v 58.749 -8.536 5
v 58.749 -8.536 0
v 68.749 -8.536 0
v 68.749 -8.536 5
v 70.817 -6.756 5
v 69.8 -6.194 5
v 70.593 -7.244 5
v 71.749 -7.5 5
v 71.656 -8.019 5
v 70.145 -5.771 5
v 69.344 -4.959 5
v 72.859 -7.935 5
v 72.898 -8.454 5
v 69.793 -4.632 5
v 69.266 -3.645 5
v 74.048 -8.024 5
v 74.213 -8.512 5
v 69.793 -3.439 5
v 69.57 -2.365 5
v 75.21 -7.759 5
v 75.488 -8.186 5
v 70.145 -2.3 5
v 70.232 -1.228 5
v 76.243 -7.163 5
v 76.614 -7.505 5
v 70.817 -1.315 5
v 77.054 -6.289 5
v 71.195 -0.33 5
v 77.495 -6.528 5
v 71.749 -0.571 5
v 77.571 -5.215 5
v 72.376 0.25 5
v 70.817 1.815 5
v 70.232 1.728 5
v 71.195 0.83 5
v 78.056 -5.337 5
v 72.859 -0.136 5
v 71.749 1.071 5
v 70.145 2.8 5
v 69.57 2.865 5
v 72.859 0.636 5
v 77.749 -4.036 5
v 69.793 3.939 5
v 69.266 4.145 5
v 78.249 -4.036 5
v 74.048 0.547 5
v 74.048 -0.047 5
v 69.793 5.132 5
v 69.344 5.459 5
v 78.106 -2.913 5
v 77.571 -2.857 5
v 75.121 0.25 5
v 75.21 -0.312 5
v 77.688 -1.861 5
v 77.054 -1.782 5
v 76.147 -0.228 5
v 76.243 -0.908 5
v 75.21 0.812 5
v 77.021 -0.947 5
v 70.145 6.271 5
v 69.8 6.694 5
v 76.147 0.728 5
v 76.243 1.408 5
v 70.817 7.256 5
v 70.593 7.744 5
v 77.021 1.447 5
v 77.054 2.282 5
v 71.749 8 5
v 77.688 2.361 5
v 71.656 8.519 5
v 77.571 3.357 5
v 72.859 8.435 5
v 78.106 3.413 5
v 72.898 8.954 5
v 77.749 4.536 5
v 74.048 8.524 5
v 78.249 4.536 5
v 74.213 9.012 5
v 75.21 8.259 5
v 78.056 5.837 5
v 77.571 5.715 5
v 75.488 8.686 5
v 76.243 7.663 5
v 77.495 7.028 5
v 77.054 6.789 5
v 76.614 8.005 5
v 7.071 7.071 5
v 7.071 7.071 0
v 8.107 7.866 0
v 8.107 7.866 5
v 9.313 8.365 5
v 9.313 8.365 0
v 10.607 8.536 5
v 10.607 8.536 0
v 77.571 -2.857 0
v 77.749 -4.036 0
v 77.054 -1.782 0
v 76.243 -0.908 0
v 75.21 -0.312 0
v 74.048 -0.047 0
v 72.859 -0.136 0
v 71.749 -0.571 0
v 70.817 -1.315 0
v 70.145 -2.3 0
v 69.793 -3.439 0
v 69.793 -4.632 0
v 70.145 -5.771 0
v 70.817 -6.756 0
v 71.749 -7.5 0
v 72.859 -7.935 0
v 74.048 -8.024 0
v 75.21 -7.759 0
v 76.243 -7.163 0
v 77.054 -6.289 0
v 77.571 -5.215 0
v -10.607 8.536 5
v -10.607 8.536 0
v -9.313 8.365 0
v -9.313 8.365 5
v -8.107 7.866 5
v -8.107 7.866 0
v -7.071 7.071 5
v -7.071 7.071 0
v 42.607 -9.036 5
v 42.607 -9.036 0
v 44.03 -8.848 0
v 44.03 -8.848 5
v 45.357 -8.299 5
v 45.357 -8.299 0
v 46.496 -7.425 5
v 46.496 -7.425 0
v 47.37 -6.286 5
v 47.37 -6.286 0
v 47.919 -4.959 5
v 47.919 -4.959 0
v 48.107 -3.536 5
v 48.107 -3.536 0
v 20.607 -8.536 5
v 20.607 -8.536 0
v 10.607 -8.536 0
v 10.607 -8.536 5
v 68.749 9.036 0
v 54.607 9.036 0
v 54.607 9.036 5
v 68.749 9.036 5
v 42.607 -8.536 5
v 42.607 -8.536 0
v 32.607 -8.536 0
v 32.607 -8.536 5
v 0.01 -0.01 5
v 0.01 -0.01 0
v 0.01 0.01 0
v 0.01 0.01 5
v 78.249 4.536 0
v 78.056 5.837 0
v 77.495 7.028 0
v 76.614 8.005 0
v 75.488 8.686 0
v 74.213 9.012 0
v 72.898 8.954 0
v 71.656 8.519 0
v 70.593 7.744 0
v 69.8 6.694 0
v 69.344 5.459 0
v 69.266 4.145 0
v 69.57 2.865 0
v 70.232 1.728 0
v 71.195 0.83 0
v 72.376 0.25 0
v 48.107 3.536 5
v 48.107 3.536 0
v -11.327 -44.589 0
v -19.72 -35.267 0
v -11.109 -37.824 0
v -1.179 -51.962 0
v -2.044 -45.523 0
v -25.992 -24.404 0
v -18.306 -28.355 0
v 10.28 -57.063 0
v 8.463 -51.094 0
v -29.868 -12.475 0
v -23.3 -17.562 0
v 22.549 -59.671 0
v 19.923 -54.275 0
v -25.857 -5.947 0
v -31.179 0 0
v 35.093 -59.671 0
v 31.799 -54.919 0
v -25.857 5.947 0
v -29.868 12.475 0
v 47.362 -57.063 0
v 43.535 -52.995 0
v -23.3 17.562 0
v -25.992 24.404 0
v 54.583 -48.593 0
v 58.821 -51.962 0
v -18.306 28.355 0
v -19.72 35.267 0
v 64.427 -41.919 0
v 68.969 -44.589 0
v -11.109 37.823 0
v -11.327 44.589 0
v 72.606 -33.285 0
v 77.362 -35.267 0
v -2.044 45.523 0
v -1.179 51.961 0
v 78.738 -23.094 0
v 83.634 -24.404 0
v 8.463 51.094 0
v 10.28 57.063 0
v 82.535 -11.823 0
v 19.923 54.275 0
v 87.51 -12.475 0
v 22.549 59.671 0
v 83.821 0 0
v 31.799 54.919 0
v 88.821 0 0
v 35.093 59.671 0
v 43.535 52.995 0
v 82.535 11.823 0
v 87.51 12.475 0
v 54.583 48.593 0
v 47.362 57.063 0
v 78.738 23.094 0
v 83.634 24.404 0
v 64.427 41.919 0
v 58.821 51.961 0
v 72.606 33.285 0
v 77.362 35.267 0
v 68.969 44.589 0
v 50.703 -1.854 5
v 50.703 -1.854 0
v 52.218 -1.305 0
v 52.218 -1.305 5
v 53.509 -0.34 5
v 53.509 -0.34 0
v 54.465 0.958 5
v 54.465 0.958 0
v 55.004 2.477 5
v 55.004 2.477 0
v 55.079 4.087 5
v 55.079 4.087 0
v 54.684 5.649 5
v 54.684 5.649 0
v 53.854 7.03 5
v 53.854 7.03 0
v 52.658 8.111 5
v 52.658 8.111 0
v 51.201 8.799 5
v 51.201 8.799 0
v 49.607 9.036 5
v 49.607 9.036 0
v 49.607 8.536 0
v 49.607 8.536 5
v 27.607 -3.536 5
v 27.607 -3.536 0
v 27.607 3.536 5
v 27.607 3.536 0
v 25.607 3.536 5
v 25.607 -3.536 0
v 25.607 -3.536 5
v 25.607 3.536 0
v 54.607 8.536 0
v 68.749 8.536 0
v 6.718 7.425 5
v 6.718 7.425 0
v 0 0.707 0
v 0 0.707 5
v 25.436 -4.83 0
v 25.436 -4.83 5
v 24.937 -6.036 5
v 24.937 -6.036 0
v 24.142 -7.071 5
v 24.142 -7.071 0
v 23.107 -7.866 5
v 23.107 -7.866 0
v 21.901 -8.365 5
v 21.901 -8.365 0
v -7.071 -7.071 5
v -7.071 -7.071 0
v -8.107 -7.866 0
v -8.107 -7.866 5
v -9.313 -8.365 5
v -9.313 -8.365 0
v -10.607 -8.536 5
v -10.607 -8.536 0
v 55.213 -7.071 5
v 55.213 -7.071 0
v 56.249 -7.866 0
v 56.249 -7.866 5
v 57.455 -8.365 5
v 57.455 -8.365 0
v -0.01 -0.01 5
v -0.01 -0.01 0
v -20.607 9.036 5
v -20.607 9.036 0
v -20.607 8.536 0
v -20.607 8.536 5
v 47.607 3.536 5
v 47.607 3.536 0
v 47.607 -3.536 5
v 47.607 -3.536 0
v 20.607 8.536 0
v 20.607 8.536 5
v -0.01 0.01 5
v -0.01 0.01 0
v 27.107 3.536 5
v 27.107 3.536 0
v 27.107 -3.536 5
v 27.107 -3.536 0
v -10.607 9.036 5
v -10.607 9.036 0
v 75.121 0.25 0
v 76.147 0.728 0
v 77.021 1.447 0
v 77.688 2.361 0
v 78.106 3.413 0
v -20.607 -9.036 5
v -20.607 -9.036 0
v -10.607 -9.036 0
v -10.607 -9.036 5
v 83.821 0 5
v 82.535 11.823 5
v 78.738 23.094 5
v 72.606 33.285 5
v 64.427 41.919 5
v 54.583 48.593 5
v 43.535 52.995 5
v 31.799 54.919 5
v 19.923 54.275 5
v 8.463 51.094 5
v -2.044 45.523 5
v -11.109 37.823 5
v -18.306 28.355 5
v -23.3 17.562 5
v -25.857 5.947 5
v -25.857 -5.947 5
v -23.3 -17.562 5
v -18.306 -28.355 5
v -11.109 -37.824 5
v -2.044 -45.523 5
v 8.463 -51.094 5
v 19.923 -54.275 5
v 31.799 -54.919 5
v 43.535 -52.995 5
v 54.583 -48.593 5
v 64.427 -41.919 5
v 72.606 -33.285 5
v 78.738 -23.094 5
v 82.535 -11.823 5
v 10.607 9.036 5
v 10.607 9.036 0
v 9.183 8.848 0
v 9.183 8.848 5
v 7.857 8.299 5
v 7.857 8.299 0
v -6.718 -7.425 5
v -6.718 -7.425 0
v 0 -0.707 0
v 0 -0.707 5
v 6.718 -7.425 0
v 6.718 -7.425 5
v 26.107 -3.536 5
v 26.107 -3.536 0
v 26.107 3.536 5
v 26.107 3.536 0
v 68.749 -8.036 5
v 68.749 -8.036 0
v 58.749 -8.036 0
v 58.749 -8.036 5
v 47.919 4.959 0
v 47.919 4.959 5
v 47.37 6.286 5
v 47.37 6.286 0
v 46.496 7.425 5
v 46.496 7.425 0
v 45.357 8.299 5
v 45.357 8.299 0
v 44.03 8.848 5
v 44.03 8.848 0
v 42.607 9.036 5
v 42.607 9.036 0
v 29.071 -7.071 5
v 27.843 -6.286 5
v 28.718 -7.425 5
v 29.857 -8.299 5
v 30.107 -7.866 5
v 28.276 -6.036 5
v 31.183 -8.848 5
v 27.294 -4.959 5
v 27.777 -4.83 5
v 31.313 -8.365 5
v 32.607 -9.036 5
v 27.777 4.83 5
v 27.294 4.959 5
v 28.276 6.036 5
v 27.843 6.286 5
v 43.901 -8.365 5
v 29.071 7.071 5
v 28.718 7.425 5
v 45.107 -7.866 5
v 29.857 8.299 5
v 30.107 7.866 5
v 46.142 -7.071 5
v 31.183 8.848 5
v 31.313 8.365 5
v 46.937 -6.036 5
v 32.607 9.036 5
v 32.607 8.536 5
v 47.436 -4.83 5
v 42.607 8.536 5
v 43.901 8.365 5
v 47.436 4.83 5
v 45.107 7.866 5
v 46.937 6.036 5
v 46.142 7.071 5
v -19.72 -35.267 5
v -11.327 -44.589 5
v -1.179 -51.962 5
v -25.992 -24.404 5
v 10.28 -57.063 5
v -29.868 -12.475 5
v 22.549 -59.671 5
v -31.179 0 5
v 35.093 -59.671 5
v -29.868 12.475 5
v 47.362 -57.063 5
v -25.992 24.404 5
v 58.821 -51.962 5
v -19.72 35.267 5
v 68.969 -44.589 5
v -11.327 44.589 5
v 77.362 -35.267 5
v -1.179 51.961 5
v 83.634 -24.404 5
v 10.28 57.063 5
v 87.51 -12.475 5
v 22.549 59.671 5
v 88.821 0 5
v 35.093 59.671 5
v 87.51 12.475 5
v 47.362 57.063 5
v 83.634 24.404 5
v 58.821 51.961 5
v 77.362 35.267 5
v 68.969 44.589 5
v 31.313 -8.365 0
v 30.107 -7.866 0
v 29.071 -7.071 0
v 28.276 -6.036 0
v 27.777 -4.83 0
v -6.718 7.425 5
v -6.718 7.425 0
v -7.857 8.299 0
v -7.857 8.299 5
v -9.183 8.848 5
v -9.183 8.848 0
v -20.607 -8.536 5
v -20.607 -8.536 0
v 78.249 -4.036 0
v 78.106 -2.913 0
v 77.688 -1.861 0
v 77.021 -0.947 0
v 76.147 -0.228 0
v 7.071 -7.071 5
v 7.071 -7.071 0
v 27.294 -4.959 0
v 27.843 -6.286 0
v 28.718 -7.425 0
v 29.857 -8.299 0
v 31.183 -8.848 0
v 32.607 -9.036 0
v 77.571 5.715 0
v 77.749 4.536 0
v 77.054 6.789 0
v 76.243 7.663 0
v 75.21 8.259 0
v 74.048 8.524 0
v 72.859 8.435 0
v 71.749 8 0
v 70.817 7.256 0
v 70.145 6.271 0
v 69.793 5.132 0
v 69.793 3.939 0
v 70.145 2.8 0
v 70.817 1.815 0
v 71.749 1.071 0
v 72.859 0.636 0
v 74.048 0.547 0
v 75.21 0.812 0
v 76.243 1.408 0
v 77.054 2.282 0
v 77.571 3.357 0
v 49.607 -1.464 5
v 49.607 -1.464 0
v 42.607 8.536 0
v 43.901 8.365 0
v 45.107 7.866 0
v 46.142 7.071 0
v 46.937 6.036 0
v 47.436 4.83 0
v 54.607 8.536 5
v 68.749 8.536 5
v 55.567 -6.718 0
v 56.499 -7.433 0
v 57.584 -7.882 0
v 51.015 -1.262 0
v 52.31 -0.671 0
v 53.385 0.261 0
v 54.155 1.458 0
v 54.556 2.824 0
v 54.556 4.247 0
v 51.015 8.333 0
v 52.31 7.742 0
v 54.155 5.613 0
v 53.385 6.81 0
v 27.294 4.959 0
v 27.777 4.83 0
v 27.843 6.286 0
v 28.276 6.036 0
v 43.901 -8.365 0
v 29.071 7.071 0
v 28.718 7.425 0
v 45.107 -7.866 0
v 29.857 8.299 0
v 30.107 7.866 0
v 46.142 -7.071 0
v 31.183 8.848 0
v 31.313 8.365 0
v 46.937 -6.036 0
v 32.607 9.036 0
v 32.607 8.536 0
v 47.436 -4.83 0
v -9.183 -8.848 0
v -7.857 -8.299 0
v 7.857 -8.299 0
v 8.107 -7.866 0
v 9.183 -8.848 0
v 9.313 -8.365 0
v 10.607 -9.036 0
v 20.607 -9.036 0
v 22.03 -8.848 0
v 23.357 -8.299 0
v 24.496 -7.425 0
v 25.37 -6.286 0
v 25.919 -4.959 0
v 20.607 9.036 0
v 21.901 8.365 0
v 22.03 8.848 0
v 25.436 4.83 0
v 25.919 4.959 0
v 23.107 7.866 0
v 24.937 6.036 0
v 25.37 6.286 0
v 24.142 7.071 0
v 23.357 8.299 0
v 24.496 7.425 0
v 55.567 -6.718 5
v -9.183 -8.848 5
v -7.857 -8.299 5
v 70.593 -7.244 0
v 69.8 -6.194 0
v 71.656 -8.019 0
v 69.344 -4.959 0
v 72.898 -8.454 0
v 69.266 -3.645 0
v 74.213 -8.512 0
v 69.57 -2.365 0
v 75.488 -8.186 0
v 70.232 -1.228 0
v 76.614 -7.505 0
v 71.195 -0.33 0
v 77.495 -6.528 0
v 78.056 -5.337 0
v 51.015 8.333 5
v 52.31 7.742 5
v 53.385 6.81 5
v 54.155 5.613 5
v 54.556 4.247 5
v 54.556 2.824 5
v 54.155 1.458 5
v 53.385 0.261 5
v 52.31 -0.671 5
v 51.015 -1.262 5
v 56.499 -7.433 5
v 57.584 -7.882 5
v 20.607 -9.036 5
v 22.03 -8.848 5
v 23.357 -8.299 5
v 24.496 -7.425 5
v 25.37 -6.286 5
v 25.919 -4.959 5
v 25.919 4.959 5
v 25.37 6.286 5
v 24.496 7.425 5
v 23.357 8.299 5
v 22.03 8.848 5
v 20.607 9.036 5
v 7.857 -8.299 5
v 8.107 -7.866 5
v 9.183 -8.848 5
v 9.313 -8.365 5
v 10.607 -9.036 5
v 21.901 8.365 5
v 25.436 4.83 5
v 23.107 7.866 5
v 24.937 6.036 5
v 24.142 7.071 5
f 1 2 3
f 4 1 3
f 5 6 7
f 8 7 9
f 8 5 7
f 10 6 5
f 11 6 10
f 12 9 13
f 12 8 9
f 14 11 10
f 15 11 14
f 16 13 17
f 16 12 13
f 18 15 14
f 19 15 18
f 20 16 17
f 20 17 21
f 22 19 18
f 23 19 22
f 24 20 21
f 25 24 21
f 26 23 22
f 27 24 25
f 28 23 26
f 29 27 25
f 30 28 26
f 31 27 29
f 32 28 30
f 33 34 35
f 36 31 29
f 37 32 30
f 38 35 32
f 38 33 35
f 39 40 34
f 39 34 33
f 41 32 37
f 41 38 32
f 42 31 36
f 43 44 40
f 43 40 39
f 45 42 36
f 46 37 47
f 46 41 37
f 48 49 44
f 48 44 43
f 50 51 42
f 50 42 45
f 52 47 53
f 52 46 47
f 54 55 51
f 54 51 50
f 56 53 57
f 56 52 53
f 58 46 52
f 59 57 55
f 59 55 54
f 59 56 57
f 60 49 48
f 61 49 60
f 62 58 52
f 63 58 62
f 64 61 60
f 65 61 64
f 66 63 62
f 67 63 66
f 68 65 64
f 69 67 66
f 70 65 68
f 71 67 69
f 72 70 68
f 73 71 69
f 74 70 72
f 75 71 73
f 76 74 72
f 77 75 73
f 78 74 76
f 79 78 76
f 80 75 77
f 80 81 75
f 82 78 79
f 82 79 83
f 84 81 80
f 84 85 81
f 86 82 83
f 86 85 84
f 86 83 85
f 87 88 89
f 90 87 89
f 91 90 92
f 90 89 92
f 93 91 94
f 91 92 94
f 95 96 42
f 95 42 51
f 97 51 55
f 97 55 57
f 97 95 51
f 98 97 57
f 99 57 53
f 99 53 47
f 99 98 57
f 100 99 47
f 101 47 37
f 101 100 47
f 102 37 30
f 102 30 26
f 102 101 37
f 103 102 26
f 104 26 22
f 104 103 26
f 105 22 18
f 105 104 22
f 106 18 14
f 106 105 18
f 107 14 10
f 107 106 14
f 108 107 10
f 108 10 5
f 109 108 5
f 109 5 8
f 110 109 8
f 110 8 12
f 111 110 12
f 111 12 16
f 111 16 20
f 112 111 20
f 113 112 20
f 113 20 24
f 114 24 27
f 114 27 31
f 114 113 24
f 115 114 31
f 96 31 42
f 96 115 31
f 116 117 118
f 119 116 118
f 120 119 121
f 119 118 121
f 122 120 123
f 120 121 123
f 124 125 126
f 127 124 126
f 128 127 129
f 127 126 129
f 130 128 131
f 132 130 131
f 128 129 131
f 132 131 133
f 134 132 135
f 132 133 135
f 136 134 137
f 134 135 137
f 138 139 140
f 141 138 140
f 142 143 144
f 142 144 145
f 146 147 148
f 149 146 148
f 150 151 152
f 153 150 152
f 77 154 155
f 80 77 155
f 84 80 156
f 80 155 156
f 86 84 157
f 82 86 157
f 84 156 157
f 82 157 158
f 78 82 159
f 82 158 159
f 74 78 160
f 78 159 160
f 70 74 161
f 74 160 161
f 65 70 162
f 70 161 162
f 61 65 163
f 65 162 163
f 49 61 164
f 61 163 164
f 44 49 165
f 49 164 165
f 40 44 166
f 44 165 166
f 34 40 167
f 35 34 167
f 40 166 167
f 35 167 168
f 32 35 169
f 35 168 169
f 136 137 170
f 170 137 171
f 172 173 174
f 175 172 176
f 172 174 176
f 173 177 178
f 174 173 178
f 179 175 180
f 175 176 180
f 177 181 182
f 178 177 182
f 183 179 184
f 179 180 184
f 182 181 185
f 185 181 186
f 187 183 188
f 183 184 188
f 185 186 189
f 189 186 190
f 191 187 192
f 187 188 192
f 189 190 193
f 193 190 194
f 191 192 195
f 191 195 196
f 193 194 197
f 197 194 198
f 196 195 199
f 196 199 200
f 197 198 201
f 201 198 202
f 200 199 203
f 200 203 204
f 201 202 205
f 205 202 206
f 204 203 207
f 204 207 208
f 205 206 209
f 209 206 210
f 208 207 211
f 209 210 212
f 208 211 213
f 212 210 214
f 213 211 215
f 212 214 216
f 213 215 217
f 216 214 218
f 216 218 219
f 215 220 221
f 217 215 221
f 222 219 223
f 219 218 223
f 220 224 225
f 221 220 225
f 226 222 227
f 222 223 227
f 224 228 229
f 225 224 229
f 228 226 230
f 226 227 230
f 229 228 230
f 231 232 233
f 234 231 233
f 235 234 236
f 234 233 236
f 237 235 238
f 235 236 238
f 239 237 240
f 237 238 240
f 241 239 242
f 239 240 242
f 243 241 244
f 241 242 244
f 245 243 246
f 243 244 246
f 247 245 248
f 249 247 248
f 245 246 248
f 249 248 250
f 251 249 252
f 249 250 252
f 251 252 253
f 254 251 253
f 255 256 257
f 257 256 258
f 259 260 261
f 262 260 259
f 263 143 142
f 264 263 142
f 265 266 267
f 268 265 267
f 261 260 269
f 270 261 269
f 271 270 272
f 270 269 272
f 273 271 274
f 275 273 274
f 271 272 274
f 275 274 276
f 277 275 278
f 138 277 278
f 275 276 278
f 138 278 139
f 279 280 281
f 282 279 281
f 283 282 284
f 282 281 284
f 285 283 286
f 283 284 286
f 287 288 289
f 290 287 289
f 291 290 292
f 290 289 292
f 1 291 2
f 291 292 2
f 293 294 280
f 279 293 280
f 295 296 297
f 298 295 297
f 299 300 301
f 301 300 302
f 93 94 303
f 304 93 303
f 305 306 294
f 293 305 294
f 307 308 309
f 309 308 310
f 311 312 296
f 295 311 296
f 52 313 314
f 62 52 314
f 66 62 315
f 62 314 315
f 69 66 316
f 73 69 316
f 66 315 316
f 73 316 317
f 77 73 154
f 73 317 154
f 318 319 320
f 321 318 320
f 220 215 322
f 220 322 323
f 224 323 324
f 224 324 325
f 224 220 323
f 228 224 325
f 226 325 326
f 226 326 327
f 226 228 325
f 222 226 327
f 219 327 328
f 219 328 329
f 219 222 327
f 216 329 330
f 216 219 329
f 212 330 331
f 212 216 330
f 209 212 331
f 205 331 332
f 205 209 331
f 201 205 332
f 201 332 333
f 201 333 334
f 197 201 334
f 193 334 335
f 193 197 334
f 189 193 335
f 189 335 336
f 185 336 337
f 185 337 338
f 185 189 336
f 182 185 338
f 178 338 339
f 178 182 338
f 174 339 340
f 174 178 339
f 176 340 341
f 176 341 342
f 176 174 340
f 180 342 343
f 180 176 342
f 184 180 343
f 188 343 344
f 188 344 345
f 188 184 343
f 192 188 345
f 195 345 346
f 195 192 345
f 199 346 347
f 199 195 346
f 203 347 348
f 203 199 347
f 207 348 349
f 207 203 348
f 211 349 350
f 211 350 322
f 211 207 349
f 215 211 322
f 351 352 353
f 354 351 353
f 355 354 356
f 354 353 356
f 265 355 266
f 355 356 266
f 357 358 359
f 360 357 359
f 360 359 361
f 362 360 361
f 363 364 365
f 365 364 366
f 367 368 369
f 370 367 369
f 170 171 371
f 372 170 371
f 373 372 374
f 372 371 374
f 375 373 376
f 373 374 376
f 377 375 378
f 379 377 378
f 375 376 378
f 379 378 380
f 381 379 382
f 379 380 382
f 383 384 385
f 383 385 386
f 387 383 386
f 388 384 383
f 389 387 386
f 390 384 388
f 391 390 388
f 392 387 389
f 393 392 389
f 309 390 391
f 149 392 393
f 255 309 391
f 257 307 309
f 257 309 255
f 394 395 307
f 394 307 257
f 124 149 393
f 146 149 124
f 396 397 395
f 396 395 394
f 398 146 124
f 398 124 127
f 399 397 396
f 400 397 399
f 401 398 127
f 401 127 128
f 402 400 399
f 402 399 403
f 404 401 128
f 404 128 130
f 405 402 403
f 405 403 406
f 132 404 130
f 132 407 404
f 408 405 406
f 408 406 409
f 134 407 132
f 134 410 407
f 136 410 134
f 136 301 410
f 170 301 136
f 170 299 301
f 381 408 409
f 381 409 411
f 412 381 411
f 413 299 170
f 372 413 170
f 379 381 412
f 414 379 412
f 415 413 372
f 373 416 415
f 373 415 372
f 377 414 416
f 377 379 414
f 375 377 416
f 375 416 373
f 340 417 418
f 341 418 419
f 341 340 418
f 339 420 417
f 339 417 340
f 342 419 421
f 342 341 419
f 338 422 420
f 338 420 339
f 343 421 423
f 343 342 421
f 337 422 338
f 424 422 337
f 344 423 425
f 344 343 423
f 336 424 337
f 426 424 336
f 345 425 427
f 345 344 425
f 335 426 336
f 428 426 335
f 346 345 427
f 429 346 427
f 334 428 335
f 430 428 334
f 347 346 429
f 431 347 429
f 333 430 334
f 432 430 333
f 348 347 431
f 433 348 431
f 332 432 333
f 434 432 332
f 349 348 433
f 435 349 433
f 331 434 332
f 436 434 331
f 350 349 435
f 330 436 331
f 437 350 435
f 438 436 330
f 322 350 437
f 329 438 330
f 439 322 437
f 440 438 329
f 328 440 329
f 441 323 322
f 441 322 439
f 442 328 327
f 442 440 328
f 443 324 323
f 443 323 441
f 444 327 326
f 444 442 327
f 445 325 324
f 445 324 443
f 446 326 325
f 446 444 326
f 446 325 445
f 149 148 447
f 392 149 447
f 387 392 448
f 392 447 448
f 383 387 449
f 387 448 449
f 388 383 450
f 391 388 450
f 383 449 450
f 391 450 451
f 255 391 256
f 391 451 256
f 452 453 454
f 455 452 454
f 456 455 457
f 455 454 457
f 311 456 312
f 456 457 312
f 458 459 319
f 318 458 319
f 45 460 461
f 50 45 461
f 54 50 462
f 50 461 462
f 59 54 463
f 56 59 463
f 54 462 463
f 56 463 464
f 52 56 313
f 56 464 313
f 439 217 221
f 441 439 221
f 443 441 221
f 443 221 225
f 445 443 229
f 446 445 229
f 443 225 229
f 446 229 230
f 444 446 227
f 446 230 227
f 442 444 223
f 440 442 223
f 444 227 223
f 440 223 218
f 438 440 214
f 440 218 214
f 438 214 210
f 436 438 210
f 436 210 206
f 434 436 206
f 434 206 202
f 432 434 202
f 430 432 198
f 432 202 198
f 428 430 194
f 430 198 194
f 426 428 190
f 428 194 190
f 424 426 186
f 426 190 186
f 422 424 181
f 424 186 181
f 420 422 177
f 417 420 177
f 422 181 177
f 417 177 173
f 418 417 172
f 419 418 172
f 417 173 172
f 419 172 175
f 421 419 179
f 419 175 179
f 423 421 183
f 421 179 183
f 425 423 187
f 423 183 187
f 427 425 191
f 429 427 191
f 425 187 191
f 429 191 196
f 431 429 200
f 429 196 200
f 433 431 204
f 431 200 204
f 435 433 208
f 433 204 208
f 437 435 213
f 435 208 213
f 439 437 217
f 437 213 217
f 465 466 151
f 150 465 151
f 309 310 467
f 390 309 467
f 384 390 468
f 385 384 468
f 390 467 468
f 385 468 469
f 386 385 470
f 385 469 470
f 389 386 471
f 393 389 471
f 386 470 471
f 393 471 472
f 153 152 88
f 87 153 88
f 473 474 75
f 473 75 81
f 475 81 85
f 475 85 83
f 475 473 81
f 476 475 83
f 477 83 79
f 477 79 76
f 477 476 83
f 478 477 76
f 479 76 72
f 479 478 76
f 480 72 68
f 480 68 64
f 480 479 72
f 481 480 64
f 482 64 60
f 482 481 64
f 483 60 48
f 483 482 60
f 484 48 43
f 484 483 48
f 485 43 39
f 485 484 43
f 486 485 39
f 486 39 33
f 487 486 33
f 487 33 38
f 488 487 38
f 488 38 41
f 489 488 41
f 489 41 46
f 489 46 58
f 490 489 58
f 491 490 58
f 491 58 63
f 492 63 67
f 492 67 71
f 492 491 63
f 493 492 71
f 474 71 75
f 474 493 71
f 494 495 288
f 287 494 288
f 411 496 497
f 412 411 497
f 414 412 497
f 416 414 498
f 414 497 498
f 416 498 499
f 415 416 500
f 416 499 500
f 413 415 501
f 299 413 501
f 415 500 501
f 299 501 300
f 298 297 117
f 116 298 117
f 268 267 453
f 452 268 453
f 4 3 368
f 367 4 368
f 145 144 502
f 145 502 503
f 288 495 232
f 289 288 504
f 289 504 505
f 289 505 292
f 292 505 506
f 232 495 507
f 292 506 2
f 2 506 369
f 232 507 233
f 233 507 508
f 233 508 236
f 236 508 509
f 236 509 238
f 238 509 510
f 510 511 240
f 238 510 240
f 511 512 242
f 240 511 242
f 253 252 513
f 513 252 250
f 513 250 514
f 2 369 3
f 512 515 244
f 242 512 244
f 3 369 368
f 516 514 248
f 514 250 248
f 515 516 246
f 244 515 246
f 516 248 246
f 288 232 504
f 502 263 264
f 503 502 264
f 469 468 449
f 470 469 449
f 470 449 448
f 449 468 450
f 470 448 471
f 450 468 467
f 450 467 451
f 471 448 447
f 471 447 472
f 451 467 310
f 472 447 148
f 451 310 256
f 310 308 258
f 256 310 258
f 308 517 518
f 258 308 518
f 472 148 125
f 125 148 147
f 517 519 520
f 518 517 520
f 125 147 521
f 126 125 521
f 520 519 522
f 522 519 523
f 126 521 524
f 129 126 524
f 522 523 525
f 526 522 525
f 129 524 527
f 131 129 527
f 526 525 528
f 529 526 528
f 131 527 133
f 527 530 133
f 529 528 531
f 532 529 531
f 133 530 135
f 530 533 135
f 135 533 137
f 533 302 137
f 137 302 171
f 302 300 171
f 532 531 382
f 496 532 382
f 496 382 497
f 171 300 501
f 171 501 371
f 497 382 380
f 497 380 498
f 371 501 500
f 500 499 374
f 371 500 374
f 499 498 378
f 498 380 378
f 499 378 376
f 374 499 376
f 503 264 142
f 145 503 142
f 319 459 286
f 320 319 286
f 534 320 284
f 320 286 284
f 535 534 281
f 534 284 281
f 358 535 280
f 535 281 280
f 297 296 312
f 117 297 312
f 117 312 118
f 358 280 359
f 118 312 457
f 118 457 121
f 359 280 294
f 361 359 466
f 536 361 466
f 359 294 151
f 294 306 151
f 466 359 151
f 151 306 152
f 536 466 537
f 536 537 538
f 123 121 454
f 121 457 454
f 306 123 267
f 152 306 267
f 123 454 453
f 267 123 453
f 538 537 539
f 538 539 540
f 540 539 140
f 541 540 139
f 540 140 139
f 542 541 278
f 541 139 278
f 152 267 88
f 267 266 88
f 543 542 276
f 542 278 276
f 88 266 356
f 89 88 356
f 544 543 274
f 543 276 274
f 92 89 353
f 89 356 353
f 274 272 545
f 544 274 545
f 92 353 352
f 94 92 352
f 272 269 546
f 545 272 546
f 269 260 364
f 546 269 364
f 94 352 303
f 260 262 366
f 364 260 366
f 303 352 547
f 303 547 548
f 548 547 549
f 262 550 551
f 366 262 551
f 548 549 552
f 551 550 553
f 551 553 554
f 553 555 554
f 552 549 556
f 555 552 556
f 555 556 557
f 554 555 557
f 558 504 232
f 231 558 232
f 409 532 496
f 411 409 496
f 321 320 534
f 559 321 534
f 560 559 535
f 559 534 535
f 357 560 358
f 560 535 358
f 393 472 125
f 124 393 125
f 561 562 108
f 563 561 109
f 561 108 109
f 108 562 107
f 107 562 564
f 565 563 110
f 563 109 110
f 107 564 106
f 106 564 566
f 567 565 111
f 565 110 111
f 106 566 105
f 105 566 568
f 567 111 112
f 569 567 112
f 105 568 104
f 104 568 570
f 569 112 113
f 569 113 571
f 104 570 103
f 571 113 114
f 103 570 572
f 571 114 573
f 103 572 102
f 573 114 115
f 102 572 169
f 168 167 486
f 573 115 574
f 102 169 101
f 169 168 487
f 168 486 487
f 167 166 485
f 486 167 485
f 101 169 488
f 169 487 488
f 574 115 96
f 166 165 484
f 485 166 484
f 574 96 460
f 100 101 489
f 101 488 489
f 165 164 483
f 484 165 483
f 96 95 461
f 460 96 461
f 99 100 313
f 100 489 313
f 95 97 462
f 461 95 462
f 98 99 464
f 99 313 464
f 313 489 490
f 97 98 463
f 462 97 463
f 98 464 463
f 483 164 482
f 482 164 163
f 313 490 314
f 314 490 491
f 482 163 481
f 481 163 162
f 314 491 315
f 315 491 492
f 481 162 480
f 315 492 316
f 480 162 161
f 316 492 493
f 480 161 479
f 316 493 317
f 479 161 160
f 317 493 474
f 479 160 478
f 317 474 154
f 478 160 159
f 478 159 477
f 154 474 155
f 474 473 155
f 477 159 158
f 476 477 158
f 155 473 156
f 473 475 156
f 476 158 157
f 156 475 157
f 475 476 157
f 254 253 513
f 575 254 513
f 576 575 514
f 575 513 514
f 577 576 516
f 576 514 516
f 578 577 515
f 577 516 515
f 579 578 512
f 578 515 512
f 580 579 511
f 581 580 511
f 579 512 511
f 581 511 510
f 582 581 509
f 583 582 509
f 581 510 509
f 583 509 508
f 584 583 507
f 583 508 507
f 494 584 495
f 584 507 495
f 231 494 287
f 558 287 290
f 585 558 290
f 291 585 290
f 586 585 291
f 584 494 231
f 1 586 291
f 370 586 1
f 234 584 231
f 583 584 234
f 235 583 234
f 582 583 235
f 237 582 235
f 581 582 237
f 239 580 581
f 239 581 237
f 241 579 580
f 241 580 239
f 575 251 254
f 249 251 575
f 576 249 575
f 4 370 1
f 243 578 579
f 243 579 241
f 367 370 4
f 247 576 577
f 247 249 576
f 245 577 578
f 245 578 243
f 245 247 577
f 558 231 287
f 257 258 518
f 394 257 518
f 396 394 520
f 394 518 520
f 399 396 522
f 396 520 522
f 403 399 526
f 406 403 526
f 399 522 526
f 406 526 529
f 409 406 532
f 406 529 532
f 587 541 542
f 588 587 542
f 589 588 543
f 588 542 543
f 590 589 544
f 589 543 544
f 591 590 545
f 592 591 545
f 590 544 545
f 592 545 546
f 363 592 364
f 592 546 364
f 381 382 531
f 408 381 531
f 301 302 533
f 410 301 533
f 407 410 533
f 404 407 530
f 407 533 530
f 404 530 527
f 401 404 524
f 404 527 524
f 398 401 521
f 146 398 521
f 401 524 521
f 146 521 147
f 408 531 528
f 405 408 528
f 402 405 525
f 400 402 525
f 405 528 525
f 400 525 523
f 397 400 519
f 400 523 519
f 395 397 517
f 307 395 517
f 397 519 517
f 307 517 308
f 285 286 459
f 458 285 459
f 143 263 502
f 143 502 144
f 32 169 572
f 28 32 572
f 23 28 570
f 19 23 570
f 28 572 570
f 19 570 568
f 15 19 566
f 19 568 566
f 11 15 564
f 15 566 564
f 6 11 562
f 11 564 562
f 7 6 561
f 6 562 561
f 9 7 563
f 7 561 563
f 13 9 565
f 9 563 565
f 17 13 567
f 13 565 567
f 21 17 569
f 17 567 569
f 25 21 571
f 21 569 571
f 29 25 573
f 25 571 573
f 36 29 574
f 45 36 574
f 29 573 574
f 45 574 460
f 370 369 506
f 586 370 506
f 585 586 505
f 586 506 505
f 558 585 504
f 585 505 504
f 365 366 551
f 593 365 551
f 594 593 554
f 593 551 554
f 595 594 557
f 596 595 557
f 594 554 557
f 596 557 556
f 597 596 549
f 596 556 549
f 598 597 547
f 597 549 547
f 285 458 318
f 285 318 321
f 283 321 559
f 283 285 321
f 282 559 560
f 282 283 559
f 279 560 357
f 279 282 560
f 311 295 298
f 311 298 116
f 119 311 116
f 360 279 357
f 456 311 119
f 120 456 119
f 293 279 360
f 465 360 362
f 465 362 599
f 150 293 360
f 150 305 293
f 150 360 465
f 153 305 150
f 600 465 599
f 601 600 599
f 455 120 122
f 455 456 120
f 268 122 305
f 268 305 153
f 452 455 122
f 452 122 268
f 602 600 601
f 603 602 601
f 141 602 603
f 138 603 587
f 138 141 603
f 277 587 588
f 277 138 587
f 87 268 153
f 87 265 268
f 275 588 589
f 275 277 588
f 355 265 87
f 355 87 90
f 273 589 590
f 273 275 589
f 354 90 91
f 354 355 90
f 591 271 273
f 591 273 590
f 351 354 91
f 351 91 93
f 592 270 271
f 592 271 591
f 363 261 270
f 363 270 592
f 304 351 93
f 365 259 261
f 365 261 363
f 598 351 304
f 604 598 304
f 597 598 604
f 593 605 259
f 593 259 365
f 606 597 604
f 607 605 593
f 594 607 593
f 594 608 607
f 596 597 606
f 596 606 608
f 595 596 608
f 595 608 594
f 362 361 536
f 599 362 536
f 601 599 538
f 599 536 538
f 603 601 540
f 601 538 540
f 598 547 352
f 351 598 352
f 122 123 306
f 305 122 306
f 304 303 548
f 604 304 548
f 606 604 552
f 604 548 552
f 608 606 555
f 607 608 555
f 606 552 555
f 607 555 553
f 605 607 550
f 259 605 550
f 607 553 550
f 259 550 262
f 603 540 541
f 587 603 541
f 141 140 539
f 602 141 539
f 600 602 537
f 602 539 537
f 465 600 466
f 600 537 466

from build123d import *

# Parameters (mm, degrees)
F0_W     = 0.5
F0_H     = 7.0710678119
F1_DEPTH = 5
F0_W_2   = 14.1421356237
F0_H_2   = 0.5
F0_R     = 4
F0_R_2   = 60
F0_R_3   = 55


# Not quite as in the source:
# - a feature names something its author has since deleted; it is built from what else it names


with BuildPart() as f1:
    # F0 (on Top) → F1 (new body)
    with BuildSketch(Plane.XY):
        with BuildLine():
            ThreePointArc((-10.6066017178, 8.5355339059), (-8.693184556, 8.1549315685), (-7.0710678119, 7.0710678119))
            Line((-7.0710678119, 7.0710678119), (-0.01, 0.01))
            Line((-0.01, 0.01), (0, 0))
            Line((0, 0), (0, 0.7071067812))
            Line((0, 0.7071067812), (-6.7175144213, 7.4246212025))
            ThreePointArc((-6.7175144213, 7.4246212025), (-8.5018428398, 8.6168713347), (-10.6066017178, 9.0355339059))
            Line((-10.6066017178, 9.0355339059), (-20.6066017178, 9.0355339059))
            Line((-20.6066017178, 9.0355339059), (-20.6066017178, 8.5355339059))
            Line((-20.6066017178, 8.5355339059), (-10.6066017178, 8.5355339059))
        make_face()
        Polygon((0, 0), (-0.01, 0.01), (-0.01, -0.01), align=None)
        with BuildLine():
            Line((0, -0.7071067812), (0, 0))
            Line((0, 0), (-0.01, -0.01))
            Line((-0.01, -0.01), (-7.0710678119, -7.0710678119))
            ThreePointArc((-7.0710678119, -7.0710678119), (-8.693184556, -8.1549315685), (-10.6066017178, -8.5355339059))
            Line((-10.6066017178, -8.5355339059), (-20.6066017178, -8.5355339059))
            Line((-20.6066017178, -8.5355339059), (-20.6066017178, -9.0355339059))
            Line((-20.6066017178, -9.0355339059), (-10.6066017178, -9.0355339059))
            ThreePointArc((-10.6066017178, -9.0355339059), (-8.5018428398, -8.6168713347), (-6.7175144213, -7.4246212025))
            Line((-6.7175144213, -7.4246212025), (0, -0.7071067812))
        make_face()
        with BuildLine():
            Line((0, 0.7071067812), (0, 0))
            Line((0, 0), (0.01, 0.01))
            Line((0.01, 0.01), (7.0710678119, 7.0710678119))
            ThreePointArc((7.0710678119, 7.0710678119), (8.693184556, 8.1549315685), (10.6066017178, 8.5355339059))
            Line((10.6066017178, 8.5355339059), (20.6066017178, 8.5355339059))
            ThreePointArc((20.6066017178, 8.5355339059), (24.1421356237, 7.0710678119), (25.6066017178, 3.5355339059))
            Line((25.6066017178, 3.5355339059), (26.1066017178, 3.5355339059))
            ThreePointArc((26.1066017178, 3.5355339059), (24.4956890143, 7.4246212025), (20.6066017178, 9.0355339059))
            Line((20.6066017178, 9.0355339059), (10.6066017178, 9.0355339059))
            ThreePointArc((10.6066017178, 9.0355339059), (8.5018428398, 8.6168713347), (6.7175144213, 7.4246212025))
            Line((6.7175144213, 7.4246212025), (0, 0.7071067812))
        make_face()
        Polygon((0.01, 0.01), (0, 0), (0.01, -0.01), align=None)
        with BuildLine():
            Line((0.01, -0.01), (0, 0))
            Line((0, 0), (0, -0.7071067812))
            Line((0, -0.7071067812), (6.7175144213, -7.4246212025))
            ThreePointArc((6.7175144213, -7.4246212025), (8.5018428398, -8.6168713347), (10.6066017178, -9.0355339059))
            Line((10.6066017178, -9.0355339059), (20.6066017178, -9.0355339059))
            ThreePointArc((20.6066017178, -9.0355339059), (24.4956890143, -7.4246212025), (26.1066017178, -3.5355339059))
            Line((26.1066017178, -3.5355339059), (25.6066017178, -3.5355339059))
            ThreePointArc((25.6066017178, -3.5355339059), (24.1421356237, -7.0710678119), (20.6066017178, -8.5355339059))
            Line((20.6066017178, -8.5355339059), (10.6066017178, -8.5355339059))
            ThreePointArc((10.6066017178, -8.5355339059), (8.693184556, -8.1549315685), (7.0710678119, -7.0710678119))
            Line((7.0710678119, -7.0710678119), (0.01, -0.01))
        make_face()
        with Locations((25.8566017178, 0)):
            Rectangle(F0_W, F0_H)
    extrude(amount=F1_DEPTH)


with BuildPart() as f1b:
    # F0 (on Top) → F1, piece 2 (new body)
    with BuildSketch(Plane.XY):
        with BuildLine():
            ThreePointArc((49.6066017178, 8.5355339059), (54.6066017178, 3.5355339059), (49.6066017178, -1.4644660941))
            Line((49.6066017178, -1.4644660941), (55.2132034356, -7.0710678119))
            ThreePointArc((55.2132034356, -7.0710678119), (56.8353201797, -8.1549315685), (58.7487373415, -8.5355339059))
            Line((58.7487373415, -8.5355339059), (68.7487373415, -8.5355339059))
            Line((68.7487373415, -8.5355339059), (68.7487373415, -8.0355339059))
            Line((68.7487373415, -8.0355339059), (58.7487373415, -8.0355339059))
            ThreePointArc((58.7487373415, -8.0355339059), (57.0266618959, -7.6929918022), (55.5667568262, -6.7175144213))
            Line((55.5667568262, -6.7175144213), (50.7032657992, -1.8540233943))
            ThreePointArc((50.7032657992, -1.8540233943), (55.0789213883, 4.086639544), (49.6066017178, 9.0355339059))
            Line((49.6066017178, 9.0355339059), (49.6066017178, 8.5355339059))
        make_face()
    extrude(amount=F1_DEPTH)


with BuildPart() as f1c:
    # F0 (on Top) → F1, piece 3 (new body)
    with BuildSketch(Plane.XY):
        with Locations((61.6776695297, 8.7855339059)):
            Rectangle(F0_W_2, F0_H_2)
    extrude(amount=F1_DEPTH)


with BuildPart() as f1d:
    # F0 (on Top) → F1, piece 4 (new body)
    with BuildSketch(Plane.XY):
        with BuildLine():
            ThreePointArc((72.3760760063, 0.25), (71.0960948862, -7.6705700824), (78.2487373415, -4.0355339059))
            ThreePointArc((78.2487373415, -4.0355339059), (77.383773518, -1.3828914506), (75.1213986767, 0.25))
            ThreePointArc((75.1213986767, 0.25), (73.7487373415, 0.0355339059), (72.3760760063, 0.25))
        make_face()
        with Locations((73.7487373415, -4.0355339059)):
            Circle(F0_R, mode=Mode.SUBTRACT)
        with BuildLine():
            ThreePointArc((72.3760760063, 0.25), (73.7487373415, 0.0355339059), (75.1213986767, 0.25))
            ThreePointArc((75.1213986767, 0.25), (73.7487373415, 0.4644660941), (72.3760760063, 0.25))
        make_face()
        with BuildLine():
            ThreePointArc((72.3760760063, 0.25), (73.7487373415, 0.4644660941), (75.1213986767, 0.25))
            ThreePointArc((75.1213986767, 0.25), (77.383773518, 1.8828914506), (78.2487373415, 4.5355339059))
            ThreePointArc((78.2487373415, 4.5355339059), (71.0960948862, 8.1705700824), (72.3760760063, 0.25))
        make_face()
        with Locations((73.7487373415, 4.5355339059)):
            Circle(F0_R, mode=Mode.SUBTRACT)
    extrude(amount=F1_DEPTH)


with BuildPart() as f1e:
    # F0 (on Top) → F1, piece 5 (new body)
    with BuildSketch(Plane.XY):
        with BuildLine():
            Line((42.6066017178, 9.0355339059), (32.6066017178, 9.0355339059))
            ThreePointArc((32.6066017178, 9.0355339059), (28.7175144213, 7.4246212025), (27.1066017178, 3.5355339059))
            Line((27.1066017178, 3.5355339059), (27.1066017178, -3.5355339059))
            ThreePointArc((27.1066017178, -3.5355339059), (28.7175144213, -7.4246212025), (32.6066017178, -9.0355339059))
            Line((32.6066017178, -9.0355339059), (42.6066017178, -9.0355339059))
            ThreePointArc((42.6066017178, -9.0355339059), (46.4956890143, -7.4246212025), (48.1066017178, -3.5355339059))
            Line((48.1066017178, -3.5355339059), (48.1066017178, 3.5355339059))
            ThreePointArc((48.1066017178, 3.5355339059), (46.4956890143, 7.4246212025), (42.6066017178, 9.0355339059))
        make_face()
        with BuildLine():
            Line((27.6066017178, -3.5355339059), (27.6066017178, 3.5355339059))
            ThreePointArc((27.6066017178, 3.5355339059), (29.0710678119, 7.0710678119), (32.6066017178, 8.5355339059))
            Line((32.6066017178, 8.5355339059), (42.6066017178, 8.5355339059))
            ThreePointArc((42.6066017178, 8.5355339059), (46.1421356237, 7.0710678119), (47.6066017178, 3.5355339059))
            Line((47.6066017178, 3.5355339059), (47.6066017178, -3.5355339059))
            ThreePointArc((47.6066017178, -3.5355339059), (46.1421356237, -7.0710678119), (42.6066017178, -8.5355339059))
            Line((42.6066017178, -8.5355339059), (32.6066017178, -8.5355339059))
            ThreePointArc((32.6066017178, -8.5355339059), (29.0710678119, -7.0710678119), (27.6066017178, -3.5355339059))
        make_face(mode=Mode.SUBTRACT)
    extrude(amount=F1_DEPTH)


with BuildPart() as f1f:
    # F0 (on Top) → F1, piece 6 (new body)
    with BuildSketch(Plane.XY):
        with Locations((28.8208982822, -3.39059e-05)):
            Circle(F0_R_2)
        with Locations((28.8208982822, -3.39059e-05)):
            Circle(F0_R_3, mode=Mode.SUBTRACT)
    extrude(amount=F1_DEPTH)


solid = Compound([f1.part, f1b.part, f1c.part, f1d.part, f1e.part, f1f.part])
